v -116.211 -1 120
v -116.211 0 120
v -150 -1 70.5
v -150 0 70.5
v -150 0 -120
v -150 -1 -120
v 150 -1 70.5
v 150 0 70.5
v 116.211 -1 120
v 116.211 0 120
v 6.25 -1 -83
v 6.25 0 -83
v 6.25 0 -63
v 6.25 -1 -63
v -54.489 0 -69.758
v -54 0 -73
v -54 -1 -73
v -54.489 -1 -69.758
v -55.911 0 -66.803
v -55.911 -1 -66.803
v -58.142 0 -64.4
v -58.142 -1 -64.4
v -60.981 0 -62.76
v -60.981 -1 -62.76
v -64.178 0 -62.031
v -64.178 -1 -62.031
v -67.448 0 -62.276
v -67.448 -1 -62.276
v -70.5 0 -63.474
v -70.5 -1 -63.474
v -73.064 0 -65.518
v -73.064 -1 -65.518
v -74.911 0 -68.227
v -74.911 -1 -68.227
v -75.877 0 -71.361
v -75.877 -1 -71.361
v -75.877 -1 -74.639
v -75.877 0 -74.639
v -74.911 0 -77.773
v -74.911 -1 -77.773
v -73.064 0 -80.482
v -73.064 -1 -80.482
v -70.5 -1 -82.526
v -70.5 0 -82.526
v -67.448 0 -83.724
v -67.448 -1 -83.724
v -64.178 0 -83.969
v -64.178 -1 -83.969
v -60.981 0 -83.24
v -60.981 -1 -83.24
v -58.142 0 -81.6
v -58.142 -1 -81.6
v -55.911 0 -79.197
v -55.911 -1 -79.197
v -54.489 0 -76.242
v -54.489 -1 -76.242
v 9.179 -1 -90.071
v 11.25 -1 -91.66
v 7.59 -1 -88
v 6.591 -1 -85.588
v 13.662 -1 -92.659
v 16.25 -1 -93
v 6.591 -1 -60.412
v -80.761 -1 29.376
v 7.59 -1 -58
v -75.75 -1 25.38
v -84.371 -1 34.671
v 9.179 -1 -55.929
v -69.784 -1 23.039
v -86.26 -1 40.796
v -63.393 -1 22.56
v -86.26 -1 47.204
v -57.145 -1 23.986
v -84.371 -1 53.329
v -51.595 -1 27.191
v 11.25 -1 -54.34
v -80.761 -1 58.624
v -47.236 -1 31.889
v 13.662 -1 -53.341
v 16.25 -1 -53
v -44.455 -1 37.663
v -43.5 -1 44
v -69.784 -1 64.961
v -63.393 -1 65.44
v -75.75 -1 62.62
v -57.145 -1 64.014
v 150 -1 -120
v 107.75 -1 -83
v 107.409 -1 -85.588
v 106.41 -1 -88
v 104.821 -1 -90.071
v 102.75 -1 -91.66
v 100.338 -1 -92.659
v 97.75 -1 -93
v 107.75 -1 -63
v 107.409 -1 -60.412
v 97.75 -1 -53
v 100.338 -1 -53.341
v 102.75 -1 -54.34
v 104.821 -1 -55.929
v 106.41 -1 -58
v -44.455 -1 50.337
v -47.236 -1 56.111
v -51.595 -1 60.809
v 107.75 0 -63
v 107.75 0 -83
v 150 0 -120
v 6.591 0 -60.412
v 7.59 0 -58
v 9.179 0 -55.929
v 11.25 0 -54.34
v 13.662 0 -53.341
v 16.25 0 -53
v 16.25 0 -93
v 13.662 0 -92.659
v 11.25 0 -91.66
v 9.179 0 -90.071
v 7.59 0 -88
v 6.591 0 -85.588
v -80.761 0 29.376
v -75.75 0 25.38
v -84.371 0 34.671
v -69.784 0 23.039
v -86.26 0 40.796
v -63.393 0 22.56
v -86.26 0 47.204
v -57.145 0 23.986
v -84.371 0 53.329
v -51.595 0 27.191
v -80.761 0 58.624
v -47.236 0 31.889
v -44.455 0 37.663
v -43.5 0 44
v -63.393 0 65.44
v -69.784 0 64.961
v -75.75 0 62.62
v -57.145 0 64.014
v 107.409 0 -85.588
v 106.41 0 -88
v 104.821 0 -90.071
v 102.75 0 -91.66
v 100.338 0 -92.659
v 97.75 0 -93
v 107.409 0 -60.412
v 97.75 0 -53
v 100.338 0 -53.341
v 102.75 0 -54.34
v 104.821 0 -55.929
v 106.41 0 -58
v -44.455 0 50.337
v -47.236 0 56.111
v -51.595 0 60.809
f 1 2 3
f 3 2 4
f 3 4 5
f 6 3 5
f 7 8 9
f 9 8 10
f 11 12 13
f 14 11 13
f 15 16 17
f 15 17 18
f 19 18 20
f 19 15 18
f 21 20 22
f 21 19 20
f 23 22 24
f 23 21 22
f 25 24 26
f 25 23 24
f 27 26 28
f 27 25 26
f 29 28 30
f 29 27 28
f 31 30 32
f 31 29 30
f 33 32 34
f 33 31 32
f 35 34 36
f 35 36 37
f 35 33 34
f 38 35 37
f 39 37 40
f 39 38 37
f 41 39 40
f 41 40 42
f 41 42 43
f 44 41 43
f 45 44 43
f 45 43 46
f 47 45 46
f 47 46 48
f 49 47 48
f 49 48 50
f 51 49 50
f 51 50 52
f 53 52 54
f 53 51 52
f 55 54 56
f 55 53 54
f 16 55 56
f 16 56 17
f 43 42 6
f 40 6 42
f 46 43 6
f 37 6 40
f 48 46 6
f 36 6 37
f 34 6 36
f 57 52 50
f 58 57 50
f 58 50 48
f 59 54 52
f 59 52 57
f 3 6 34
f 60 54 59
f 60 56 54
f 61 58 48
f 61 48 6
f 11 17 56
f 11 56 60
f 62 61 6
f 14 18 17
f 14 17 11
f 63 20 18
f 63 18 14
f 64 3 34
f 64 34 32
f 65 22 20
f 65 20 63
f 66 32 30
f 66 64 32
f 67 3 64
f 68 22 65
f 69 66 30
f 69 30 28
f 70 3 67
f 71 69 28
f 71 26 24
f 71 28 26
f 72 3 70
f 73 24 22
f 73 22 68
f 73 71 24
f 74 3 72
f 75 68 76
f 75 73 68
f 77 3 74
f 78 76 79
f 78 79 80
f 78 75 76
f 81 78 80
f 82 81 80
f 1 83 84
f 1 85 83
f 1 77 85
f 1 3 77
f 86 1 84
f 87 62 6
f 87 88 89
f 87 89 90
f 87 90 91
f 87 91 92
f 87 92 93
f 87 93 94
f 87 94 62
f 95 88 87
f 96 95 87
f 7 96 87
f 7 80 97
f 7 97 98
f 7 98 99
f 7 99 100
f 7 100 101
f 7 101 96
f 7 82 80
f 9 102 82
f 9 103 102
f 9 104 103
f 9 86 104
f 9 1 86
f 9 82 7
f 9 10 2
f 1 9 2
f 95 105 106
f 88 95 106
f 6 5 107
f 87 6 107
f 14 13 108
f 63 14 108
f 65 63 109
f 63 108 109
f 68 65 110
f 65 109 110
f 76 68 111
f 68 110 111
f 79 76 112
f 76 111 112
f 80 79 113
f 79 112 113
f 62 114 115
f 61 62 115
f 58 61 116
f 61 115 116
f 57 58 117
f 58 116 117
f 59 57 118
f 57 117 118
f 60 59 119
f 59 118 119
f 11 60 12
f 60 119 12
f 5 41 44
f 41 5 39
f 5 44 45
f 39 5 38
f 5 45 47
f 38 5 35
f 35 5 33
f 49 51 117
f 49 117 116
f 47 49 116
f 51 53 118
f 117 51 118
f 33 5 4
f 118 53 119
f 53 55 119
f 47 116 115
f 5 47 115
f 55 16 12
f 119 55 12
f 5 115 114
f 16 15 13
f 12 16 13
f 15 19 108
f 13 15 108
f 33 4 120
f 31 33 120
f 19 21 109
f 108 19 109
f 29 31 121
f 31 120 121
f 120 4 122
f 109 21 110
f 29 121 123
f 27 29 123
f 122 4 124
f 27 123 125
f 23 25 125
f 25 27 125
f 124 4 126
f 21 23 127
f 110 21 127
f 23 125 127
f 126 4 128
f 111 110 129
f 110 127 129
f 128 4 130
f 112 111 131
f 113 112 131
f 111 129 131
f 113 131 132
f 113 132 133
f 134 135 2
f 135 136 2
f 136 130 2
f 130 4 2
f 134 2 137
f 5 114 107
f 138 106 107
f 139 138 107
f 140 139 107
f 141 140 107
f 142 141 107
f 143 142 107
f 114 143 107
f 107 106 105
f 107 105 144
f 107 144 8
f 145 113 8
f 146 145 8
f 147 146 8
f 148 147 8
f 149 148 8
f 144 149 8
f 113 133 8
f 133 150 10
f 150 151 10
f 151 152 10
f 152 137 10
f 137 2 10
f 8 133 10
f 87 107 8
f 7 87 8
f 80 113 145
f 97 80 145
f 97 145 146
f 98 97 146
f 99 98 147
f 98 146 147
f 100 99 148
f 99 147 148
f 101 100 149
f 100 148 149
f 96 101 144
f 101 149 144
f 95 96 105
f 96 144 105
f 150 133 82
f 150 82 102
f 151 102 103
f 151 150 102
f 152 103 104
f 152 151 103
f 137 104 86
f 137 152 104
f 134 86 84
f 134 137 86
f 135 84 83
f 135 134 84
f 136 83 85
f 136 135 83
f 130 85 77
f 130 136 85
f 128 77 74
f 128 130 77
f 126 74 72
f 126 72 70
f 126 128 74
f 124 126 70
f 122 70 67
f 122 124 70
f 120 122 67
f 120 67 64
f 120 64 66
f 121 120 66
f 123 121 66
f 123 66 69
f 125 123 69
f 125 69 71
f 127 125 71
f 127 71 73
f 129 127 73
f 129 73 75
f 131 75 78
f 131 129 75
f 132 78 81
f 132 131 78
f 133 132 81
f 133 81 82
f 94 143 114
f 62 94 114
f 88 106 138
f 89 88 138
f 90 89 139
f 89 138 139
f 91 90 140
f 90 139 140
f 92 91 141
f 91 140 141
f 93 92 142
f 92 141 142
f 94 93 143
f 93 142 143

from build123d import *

# Parameters (mm, degrees)
F0_R     = 11
F0_R_2   = 21.5
F1_DEPTH = 1


with BuildPart() as f1:
    # F0 (on Front) → F1 (new body)
    with BuildSketch(Plane.XZ):
        Polygon((-150, -120), (150, -120), (150, 70.5), (116.211094, 120), (-116.211094, 120), (-150, 70.5), align=None)
        with Locations((-65, -73)):
            Circle(F0_R, mode=Mode.SUBTRACT)
        with BuildLine():
            ThreePointArc((107.75, -83), (104.821068, -90.071068), (97.75, -93))
            Line((97.75, -93), (16.25, -93))
            ThreePointArc((16.25, -93), (9.178932, -90.071068), (6.25, -83))
            Line((6.25, -83), (6.25, -63))
            ThreePointArc((6.25, -63), (9.178932, -55.928932), (16.25, -53))
            Line((16.25, -53), (97.75, -53))
            ThreePointArc((97.75, -53), (104.821068, -55.928932), (107.75, -63))
            Line((107.75, -63), (107.75, -83))
        make_face(mode=Mode.SUBTRACT)
        with Locations((-65, 44)):
            Circle(F0_R_2, mode=Mode.SUBTRACT)
    extrude(amount=F1_DEPTH)


solid = f1.part
